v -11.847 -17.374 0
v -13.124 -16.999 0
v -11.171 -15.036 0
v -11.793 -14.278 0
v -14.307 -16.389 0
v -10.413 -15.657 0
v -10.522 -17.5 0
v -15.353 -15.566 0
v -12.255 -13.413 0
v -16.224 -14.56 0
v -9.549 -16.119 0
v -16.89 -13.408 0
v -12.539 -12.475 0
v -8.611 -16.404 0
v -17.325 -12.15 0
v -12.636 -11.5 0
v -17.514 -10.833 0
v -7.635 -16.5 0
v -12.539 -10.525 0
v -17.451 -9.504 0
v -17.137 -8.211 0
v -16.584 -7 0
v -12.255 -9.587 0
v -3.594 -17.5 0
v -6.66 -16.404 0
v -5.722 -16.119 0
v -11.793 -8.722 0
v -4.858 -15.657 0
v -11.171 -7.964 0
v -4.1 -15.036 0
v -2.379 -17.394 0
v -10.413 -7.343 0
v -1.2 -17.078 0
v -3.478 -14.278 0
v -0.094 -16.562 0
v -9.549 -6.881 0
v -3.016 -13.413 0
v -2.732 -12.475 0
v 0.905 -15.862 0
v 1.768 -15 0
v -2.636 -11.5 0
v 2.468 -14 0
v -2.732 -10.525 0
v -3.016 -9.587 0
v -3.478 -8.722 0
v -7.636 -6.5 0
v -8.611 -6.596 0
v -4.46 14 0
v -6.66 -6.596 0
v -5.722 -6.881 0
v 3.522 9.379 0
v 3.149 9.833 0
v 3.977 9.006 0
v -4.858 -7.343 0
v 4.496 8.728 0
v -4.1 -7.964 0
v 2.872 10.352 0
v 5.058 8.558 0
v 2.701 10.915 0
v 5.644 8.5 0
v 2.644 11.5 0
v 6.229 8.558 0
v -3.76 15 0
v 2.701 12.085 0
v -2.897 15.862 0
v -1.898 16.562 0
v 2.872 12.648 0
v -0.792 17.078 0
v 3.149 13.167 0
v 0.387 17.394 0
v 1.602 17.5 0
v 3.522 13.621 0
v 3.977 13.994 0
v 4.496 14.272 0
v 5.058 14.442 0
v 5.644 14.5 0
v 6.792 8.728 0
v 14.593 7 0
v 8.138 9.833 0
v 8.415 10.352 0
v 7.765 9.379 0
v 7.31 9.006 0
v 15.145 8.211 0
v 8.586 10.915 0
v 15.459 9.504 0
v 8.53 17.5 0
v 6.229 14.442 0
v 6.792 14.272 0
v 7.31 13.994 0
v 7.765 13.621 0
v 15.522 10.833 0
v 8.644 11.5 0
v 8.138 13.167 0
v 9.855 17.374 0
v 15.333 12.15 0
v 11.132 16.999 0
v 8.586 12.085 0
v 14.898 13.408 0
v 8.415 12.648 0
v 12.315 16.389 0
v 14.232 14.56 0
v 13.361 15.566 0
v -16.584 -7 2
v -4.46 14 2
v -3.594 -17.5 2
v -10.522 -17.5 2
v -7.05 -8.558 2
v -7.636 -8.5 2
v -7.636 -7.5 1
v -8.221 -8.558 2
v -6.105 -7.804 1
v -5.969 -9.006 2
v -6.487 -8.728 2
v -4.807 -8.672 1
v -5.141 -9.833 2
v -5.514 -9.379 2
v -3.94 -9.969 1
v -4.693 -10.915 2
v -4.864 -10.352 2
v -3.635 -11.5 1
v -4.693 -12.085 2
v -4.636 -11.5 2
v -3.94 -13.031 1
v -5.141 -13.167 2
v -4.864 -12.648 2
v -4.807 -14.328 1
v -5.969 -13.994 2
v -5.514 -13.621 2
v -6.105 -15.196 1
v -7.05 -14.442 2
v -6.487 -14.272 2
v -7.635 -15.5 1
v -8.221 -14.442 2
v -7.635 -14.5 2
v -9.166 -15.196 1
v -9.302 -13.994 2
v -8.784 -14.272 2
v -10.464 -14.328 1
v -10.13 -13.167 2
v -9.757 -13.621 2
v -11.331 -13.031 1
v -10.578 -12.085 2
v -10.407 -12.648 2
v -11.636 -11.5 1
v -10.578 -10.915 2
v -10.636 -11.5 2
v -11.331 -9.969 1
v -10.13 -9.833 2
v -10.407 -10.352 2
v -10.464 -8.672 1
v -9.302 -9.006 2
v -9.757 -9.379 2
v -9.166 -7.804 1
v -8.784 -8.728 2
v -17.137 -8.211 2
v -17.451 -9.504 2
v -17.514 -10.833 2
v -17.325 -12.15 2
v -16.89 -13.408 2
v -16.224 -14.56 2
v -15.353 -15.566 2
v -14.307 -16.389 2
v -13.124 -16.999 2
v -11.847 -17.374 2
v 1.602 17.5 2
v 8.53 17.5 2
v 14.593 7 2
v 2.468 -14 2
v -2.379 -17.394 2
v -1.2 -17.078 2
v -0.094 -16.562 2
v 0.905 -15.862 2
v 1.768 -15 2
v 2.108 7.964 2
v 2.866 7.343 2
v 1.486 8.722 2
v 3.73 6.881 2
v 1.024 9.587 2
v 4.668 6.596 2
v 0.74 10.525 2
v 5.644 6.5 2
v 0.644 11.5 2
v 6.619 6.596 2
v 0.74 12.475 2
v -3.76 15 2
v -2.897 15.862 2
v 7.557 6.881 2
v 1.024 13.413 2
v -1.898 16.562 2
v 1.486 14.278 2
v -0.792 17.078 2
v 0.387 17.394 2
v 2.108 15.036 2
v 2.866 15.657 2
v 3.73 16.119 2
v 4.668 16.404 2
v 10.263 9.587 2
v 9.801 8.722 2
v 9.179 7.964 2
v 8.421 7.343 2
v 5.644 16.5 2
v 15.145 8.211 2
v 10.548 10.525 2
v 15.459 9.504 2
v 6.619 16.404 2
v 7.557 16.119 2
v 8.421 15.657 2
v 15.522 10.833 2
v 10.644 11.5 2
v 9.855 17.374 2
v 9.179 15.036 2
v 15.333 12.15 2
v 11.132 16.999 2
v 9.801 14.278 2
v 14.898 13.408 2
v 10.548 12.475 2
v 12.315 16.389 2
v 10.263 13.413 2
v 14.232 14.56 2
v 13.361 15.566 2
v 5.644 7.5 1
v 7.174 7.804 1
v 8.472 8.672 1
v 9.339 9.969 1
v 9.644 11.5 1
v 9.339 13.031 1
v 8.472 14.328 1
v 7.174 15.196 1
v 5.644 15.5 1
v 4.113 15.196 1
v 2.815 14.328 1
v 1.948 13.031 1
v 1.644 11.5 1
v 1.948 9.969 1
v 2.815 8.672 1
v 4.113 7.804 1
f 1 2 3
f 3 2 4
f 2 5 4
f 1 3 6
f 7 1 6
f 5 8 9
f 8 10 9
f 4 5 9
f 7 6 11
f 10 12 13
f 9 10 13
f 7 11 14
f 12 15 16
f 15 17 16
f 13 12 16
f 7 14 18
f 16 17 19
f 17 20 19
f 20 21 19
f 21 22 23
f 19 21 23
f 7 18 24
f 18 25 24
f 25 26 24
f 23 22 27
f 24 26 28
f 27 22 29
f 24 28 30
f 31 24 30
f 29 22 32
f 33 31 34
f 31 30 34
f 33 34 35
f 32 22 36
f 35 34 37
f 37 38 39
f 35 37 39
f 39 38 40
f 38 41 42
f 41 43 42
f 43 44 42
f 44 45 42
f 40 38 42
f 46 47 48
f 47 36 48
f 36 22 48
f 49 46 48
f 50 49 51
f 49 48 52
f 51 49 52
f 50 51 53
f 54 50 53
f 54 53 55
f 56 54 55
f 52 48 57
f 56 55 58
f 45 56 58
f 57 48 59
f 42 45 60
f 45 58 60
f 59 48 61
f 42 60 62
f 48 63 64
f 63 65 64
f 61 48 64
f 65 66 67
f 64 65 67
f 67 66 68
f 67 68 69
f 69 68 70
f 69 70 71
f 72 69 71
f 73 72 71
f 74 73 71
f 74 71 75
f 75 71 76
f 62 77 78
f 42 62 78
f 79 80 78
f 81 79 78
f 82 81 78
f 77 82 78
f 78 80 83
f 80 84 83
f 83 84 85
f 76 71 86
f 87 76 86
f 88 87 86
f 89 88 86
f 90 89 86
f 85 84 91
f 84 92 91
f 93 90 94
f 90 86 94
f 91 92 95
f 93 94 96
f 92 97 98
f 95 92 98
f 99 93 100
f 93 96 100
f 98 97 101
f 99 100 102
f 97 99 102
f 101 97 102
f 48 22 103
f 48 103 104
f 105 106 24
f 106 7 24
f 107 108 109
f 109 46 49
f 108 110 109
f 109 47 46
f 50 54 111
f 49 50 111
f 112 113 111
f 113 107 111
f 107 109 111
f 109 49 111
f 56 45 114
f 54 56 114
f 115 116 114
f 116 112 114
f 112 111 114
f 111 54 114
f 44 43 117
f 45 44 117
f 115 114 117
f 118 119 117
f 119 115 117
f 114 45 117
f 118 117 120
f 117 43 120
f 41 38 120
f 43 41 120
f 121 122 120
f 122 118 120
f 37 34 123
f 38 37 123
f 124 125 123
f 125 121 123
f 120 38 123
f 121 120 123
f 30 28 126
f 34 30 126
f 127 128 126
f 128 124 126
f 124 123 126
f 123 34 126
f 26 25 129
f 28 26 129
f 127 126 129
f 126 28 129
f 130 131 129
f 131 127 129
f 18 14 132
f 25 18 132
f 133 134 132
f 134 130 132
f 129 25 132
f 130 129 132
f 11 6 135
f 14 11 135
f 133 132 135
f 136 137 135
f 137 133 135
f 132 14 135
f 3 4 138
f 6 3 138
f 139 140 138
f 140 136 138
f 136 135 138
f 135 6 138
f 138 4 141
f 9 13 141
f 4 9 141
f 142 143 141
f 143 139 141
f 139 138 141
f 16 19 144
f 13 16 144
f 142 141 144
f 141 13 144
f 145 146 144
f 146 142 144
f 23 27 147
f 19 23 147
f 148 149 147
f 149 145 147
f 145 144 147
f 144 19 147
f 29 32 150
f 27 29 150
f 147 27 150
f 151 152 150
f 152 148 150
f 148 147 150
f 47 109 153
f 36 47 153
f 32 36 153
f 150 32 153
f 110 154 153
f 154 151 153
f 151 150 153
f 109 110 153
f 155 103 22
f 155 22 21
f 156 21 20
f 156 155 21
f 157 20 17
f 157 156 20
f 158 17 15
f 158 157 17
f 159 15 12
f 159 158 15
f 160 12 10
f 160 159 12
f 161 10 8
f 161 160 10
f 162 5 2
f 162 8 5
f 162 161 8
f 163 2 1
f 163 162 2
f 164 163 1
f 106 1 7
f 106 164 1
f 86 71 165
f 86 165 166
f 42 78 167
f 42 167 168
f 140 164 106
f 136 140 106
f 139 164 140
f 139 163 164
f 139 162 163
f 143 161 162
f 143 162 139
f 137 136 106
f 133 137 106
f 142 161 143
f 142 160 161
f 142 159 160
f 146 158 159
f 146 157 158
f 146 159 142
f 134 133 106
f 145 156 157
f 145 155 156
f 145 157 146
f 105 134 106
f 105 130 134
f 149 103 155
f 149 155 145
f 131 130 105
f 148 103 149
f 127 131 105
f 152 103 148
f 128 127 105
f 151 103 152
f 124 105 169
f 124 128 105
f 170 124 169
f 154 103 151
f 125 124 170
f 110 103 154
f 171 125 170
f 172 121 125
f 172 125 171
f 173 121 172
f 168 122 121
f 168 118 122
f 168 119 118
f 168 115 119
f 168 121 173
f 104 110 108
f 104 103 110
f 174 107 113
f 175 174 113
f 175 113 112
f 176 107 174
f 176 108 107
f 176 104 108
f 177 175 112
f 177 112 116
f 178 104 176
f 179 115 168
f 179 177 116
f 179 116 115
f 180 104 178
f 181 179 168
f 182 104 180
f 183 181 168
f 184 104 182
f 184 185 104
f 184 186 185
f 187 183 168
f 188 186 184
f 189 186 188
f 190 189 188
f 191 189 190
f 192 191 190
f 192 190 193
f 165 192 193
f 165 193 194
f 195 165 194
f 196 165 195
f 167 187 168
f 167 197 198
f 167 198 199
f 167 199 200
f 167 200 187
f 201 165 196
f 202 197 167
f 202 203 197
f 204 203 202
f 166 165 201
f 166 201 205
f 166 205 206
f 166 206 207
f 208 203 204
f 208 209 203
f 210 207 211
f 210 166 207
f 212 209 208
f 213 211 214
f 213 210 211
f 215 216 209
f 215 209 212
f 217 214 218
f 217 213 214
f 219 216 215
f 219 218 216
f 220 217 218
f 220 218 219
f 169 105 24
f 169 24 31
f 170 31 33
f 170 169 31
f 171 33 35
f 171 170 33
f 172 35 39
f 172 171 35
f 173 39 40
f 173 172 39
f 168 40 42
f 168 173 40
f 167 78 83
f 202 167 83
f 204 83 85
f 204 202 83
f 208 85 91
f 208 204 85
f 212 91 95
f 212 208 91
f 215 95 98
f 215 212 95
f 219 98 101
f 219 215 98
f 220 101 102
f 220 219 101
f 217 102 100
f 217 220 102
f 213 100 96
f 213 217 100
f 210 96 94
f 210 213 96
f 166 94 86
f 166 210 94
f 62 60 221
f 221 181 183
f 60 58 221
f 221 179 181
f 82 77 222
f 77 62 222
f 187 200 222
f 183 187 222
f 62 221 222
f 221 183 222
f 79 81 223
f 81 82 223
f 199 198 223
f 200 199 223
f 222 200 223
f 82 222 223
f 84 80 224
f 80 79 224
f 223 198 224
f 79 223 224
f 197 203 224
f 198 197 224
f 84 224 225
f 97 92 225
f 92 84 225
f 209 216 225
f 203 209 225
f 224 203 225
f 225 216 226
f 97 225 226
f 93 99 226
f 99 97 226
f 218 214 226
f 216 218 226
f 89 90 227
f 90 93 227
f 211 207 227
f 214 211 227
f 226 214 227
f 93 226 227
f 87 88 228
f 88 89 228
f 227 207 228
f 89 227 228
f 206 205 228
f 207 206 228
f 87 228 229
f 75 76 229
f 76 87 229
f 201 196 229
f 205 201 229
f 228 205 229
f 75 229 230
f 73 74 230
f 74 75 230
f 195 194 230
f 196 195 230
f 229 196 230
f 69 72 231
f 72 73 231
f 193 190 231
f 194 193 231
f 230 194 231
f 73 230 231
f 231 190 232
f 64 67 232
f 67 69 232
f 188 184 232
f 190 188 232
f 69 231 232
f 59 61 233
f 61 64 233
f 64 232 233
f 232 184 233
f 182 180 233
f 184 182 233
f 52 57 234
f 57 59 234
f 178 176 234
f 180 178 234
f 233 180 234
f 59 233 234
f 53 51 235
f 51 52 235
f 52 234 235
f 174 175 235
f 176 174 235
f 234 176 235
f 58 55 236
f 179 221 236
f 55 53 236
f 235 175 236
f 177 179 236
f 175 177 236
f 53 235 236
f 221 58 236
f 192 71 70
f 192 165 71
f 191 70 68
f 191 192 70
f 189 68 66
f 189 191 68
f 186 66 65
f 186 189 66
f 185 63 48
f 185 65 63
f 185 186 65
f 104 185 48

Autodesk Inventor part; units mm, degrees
ref_plane "YZ Plane" through (0, 0, 0) normal (1, 0, 0) x (0, 1, 0)
ref_plane "XZ Plane" through (0, 0, 0) normal (0, 1, 0) x (-1, 0, 0)
ref_plane "XY Plane" through (0, 0, 0) normal (0, 0, 1) x (1, 0, 0)
sketch "Boceto1" plane through (0, 0, 0) normal (0, 0, 1) x (1, 0, 0)
  line L0 (20.6547, 17.5) -> (0.4474, -17.5)
  line L1 (-22.6466, -17.5) -> (-2.4393, 17.5)
  circle A0 centre (5.6436, 11.5) radius 2.5
  circle A1 centre (-7.6355, -11.5) radius 2.5
  line L2 (-7, 0) -> (7, 0) construction
  line L3 (-2.4393, 17.5) -> (20.6547, 17.5)
  line L4 (-22.6466, -17.5) -> (0.4474, -17.5)
  point P0 (0, 0)
  point P1 (10.5511, 0)
  point P2 (0, 0)
  dimension "d18" = 60
  dimension "d19" = 10
  dimension "d20" = 10
  dimension "d22" = 20
  dimension "d23" = 6
  dimension "d24" = 6
  dimension "d25" = 2.4393
  dimension "d26" = 5
  dimension "d27" = 14
  dimension "d28" = 35
extrude "Cuerpo lamina" add sketch "Boceto1" along normal blind 2
fillet "R7" radius 7 4 edges at (20.6547, 17.5, 1) (-2.4393, 17.5, 1) (0.4474, -17.5, 1) (-22.6466, -17.5, 1)
sketch "Boceto3" plane through (0, 0, 0) normal (0, 0, -1) x (-1, 0, 0)
  circle A0 centre (-5.6436, 11.5) radius 2.5 projected
  circle A1 centre (7.6355, -11.5) radius 2.5 projected
  point P0 (0, 0)
hole "BCA M5 Izq" at (-7.6355, -11.5, 0) direction (0, 0, 1) diameter 4.134 depth 14.2 tip angle 118 countersink diameter 10 countersink angle 90 thread size "M5x0.8" class "6H" standard "ANSI Metric M Profile"
sketch "Sketch4" plane through (0, 0, 2) normal (0, 0, 1) x (1, 0, 0)
  circle A0 centre (5.6436, 11.5) radius 2.5 projected
  circle A1 centre (-7.6355, -11.5) radius 2.5 projected
  point P0 (0, 0)
hole "BCA M5 Der" at (5.6436, 11.5, 2) direction (0, 0, -1) diameter 5 depth 14.2 tip angle 118 countersink diameter 10 countersink angle 90
equation "\"d19\" = 0.5 * d22"
equation "\"d20\" = d19"
equation "\"d24\" = d23"
properties part number "Lamina"
